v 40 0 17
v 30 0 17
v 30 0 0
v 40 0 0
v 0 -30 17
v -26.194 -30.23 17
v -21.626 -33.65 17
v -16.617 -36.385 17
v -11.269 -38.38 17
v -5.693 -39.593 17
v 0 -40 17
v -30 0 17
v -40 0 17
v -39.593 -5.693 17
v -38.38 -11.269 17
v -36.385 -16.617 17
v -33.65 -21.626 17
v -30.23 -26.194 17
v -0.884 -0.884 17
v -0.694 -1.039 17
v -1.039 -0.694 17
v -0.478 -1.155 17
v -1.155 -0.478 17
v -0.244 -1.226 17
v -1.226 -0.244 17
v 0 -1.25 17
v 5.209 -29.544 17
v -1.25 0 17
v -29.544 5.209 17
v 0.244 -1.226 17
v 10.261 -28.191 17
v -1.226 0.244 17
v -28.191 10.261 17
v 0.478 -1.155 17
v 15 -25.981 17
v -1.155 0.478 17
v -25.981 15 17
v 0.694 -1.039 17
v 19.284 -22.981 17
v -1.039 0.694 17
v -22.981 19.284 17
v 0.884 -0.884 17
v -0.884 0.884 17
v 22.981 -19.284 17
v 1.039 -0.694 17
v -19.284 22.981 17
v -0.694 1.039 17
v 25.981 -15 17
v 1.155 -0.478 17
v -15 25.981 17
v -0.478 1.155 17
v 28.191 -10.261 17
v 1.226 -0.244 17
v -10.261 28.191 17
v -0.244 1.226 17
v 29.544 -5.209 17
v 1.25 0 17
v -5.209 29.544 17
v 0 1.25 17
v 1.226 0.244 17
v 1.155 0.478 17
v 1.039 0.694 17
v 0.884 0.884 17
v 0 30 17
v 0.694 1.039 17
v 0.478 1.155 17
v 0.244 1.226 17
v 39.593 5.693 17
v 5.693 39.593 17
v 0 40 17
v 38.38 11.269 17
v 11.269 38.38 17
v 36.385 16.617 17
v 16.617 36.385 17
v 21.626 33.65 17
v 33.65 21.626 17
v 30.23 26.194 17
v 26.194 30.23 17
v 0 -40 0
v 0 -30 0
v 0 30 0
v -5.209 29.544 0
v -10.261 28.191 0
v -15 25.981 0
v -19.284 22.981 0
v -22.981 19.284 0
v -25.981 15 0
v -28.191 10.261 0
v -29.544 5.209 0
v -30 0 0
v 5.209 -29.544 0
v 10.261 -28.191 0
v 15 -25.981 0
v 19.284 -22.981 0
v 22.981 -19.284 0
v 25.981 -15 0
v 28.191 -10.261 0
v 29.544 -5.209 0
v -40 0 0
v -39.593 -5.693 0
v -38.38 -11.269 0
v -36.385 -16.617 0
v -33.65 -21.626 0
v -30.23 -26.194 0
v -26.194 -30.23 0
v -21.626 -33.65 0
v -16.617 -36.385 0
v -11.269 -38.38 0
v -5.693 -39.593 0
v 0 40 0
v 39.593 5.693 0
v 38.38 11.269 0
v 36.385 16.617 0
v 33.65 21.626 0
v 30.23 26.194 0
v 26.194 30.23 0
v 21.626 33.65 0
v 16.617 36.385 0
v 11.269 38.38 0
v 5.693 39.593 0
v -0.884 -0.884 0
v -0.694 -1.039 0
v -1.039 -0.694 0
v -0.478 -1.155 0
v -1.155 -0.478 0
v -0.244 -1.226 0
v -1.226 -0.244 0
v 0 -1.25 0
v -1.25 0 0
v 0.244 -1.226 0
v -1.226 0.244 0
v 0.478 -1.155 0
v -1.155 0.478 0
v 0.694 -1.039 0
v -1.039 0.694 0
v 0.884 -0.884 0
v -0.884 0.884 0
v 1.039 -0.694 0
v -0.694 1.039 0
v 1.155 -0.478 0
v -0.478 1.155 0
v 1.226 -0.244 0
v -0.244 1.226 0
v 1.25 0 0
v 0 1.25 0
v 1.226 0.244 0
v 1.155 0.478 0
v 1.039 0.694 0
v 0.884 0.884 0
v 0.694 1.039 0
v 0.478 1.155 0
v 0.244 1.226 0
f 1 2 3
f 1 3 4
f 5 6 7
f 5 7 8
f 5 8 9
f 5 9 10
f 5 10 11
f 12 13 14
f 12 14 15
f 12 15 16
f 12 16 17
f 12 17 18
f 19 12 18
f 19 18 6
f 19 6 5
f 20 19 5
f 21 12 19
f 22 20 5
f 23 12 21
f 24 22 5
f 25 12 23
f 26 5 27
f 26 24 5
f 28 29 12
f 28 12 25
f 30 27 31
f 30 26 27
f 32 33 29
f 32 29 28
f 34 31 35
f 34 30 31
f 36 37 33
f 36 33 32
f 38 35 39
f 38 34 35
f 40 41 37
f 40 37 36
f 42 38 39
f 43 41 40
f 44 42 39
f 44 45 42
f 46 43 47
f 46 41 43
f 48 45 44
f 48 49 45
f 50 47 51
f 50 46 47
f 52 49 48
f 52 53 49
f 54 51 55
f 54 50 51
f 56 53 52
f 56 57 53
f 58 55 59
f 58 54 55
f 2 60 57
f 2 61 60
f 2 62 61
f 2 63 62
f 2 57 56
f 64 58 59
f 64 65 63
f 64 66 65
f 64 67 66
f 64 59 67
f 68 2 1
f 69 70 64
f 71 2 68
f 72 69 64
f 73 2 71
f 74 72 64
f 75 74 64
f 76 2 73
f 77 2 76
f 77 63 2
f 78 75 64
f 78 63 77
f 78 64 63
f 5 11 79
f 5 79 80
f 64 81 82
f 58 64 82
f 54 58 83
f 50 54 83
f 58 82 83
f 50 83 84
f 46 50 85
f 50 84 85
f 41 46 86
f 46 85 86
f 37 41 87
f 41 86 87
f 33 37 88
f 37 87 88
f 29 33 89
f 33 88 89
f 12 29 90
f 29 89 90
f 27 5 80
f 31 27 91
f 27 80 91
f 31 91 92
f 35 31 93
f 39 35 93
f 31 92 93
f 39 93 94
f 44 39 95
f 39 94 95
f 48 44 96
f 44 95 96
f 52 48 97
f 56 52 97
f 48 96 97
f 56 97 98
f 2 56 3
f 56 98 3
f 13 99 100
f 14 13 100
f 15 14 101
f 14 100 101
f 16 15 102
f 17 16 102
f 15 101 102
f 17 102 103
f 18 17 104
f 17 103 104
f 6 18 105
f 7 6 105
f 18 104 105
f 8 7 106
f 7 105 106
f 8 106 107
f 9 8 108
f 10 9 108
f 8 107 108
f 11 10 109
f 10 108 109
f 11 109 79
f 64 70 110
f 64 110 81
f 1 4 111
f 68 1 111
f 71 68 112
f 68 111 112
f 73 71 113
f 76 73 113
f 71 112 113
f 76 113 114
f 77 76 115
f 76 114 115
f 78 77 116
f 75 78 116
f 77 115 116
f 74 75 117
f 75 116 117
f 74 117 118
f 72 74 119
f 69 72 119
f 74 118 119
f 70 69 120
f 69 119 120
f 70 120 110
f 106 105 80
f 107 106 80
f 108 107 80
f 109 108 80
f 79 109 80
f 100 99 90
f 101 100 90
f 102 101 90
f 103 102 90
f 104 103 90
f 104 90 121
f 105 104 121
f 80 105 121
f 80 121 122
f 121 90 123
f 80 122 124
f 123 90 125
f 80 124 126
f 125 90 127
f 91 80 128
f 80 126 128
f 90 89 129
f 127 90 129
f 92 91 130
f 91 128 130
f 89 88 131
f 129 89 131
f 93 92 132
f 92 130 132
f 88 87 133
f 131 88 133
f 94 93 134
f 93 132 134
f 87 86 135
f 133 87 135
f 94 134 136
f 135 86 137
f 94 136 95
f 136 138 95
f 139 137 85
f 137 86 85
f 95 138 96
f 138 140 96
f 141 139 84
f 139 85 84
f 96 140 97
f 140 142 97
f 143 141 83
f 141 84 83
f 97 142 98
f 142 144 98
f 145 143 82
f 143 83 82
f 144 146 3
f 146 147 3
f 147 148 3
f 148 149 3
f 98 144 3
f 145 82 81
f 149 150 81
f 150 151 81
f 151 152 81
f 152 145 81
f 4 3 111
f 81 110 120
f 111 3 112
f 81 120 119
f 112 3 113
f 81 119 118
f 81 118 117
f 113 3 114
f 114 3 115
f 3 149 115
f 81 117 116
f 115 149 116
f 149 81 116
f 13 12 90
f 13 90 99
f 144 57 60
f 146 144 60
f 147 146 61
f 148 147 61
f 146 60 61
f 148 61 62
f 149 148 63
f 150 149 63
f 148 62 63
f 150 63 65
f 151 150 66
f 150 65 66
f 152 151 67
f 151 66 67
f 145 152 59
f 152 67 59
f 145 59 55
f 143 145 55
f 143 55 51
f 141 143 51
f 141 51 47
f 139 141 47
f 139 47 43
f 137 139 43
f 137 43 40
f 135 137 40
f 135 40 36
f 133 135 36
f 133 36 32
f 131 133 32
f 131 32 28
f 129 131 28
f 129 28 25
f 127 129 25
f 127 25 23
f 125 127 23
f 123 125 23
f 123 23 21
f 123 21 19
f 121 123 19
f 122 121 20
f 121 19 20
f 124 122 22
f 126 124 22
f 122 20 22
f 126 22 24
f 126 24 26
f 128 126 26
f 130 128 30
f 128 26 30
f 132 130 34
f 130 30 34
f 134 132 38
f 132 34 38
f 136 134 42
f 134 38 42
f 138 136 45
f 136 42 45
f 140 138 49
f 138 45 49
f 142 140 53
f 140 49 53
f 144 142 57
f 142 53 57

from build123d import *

# Parameters (mm, degrees)
ESQUISSE1_R             = 30
BOSS_EXTRU_1_DEPTH      = 17
ESQUISSE2_R             = 1.25
ENL_V_MAT_EXTRU_1_DEPTH = 100


with BuildPart() as part:
    # Esquisse1 → Boss.-Extru.1 (new body)
    with BuildSketch(Plane.XY):
        Circle(ESQUISSE1_R)
        with BuildLine():
            Line((0, 40), (0, 30))
            ThreePointArc((0, 30), (21.213203436, 21.213203436), (30, 0))
            Line((30, 0), (40, 0))
            ThreePointArc((40, 0), (28.284271247, 28.284271247), (0, 40))
        make_face()
        with BuildLine():
            ThreePointArc((0, -30), (-21.213203436, -21.213203436), (-30, 0))
            Line((-30, 0), (-40, 0))
            ThreePointArc((-40, 0), (-28.284271247, -28.284271247), (0, -40))
            Line((0, -40), (0, -30))
        make_face()
    extrude(amount=BOSS_EXTRU_1_DEPTH)

    # Esquisse2 → Enlèv. mat.-Extru.1 (cut)
    with BuildSketch(Plane.XY.offset(17)):
        Circle(ESQUISSE2_R)
    extrude(amount=-ENL_V_MAT_EXTRU_1_DEPTH, mode=Mode.SUBTRACT)


solid = part.part
